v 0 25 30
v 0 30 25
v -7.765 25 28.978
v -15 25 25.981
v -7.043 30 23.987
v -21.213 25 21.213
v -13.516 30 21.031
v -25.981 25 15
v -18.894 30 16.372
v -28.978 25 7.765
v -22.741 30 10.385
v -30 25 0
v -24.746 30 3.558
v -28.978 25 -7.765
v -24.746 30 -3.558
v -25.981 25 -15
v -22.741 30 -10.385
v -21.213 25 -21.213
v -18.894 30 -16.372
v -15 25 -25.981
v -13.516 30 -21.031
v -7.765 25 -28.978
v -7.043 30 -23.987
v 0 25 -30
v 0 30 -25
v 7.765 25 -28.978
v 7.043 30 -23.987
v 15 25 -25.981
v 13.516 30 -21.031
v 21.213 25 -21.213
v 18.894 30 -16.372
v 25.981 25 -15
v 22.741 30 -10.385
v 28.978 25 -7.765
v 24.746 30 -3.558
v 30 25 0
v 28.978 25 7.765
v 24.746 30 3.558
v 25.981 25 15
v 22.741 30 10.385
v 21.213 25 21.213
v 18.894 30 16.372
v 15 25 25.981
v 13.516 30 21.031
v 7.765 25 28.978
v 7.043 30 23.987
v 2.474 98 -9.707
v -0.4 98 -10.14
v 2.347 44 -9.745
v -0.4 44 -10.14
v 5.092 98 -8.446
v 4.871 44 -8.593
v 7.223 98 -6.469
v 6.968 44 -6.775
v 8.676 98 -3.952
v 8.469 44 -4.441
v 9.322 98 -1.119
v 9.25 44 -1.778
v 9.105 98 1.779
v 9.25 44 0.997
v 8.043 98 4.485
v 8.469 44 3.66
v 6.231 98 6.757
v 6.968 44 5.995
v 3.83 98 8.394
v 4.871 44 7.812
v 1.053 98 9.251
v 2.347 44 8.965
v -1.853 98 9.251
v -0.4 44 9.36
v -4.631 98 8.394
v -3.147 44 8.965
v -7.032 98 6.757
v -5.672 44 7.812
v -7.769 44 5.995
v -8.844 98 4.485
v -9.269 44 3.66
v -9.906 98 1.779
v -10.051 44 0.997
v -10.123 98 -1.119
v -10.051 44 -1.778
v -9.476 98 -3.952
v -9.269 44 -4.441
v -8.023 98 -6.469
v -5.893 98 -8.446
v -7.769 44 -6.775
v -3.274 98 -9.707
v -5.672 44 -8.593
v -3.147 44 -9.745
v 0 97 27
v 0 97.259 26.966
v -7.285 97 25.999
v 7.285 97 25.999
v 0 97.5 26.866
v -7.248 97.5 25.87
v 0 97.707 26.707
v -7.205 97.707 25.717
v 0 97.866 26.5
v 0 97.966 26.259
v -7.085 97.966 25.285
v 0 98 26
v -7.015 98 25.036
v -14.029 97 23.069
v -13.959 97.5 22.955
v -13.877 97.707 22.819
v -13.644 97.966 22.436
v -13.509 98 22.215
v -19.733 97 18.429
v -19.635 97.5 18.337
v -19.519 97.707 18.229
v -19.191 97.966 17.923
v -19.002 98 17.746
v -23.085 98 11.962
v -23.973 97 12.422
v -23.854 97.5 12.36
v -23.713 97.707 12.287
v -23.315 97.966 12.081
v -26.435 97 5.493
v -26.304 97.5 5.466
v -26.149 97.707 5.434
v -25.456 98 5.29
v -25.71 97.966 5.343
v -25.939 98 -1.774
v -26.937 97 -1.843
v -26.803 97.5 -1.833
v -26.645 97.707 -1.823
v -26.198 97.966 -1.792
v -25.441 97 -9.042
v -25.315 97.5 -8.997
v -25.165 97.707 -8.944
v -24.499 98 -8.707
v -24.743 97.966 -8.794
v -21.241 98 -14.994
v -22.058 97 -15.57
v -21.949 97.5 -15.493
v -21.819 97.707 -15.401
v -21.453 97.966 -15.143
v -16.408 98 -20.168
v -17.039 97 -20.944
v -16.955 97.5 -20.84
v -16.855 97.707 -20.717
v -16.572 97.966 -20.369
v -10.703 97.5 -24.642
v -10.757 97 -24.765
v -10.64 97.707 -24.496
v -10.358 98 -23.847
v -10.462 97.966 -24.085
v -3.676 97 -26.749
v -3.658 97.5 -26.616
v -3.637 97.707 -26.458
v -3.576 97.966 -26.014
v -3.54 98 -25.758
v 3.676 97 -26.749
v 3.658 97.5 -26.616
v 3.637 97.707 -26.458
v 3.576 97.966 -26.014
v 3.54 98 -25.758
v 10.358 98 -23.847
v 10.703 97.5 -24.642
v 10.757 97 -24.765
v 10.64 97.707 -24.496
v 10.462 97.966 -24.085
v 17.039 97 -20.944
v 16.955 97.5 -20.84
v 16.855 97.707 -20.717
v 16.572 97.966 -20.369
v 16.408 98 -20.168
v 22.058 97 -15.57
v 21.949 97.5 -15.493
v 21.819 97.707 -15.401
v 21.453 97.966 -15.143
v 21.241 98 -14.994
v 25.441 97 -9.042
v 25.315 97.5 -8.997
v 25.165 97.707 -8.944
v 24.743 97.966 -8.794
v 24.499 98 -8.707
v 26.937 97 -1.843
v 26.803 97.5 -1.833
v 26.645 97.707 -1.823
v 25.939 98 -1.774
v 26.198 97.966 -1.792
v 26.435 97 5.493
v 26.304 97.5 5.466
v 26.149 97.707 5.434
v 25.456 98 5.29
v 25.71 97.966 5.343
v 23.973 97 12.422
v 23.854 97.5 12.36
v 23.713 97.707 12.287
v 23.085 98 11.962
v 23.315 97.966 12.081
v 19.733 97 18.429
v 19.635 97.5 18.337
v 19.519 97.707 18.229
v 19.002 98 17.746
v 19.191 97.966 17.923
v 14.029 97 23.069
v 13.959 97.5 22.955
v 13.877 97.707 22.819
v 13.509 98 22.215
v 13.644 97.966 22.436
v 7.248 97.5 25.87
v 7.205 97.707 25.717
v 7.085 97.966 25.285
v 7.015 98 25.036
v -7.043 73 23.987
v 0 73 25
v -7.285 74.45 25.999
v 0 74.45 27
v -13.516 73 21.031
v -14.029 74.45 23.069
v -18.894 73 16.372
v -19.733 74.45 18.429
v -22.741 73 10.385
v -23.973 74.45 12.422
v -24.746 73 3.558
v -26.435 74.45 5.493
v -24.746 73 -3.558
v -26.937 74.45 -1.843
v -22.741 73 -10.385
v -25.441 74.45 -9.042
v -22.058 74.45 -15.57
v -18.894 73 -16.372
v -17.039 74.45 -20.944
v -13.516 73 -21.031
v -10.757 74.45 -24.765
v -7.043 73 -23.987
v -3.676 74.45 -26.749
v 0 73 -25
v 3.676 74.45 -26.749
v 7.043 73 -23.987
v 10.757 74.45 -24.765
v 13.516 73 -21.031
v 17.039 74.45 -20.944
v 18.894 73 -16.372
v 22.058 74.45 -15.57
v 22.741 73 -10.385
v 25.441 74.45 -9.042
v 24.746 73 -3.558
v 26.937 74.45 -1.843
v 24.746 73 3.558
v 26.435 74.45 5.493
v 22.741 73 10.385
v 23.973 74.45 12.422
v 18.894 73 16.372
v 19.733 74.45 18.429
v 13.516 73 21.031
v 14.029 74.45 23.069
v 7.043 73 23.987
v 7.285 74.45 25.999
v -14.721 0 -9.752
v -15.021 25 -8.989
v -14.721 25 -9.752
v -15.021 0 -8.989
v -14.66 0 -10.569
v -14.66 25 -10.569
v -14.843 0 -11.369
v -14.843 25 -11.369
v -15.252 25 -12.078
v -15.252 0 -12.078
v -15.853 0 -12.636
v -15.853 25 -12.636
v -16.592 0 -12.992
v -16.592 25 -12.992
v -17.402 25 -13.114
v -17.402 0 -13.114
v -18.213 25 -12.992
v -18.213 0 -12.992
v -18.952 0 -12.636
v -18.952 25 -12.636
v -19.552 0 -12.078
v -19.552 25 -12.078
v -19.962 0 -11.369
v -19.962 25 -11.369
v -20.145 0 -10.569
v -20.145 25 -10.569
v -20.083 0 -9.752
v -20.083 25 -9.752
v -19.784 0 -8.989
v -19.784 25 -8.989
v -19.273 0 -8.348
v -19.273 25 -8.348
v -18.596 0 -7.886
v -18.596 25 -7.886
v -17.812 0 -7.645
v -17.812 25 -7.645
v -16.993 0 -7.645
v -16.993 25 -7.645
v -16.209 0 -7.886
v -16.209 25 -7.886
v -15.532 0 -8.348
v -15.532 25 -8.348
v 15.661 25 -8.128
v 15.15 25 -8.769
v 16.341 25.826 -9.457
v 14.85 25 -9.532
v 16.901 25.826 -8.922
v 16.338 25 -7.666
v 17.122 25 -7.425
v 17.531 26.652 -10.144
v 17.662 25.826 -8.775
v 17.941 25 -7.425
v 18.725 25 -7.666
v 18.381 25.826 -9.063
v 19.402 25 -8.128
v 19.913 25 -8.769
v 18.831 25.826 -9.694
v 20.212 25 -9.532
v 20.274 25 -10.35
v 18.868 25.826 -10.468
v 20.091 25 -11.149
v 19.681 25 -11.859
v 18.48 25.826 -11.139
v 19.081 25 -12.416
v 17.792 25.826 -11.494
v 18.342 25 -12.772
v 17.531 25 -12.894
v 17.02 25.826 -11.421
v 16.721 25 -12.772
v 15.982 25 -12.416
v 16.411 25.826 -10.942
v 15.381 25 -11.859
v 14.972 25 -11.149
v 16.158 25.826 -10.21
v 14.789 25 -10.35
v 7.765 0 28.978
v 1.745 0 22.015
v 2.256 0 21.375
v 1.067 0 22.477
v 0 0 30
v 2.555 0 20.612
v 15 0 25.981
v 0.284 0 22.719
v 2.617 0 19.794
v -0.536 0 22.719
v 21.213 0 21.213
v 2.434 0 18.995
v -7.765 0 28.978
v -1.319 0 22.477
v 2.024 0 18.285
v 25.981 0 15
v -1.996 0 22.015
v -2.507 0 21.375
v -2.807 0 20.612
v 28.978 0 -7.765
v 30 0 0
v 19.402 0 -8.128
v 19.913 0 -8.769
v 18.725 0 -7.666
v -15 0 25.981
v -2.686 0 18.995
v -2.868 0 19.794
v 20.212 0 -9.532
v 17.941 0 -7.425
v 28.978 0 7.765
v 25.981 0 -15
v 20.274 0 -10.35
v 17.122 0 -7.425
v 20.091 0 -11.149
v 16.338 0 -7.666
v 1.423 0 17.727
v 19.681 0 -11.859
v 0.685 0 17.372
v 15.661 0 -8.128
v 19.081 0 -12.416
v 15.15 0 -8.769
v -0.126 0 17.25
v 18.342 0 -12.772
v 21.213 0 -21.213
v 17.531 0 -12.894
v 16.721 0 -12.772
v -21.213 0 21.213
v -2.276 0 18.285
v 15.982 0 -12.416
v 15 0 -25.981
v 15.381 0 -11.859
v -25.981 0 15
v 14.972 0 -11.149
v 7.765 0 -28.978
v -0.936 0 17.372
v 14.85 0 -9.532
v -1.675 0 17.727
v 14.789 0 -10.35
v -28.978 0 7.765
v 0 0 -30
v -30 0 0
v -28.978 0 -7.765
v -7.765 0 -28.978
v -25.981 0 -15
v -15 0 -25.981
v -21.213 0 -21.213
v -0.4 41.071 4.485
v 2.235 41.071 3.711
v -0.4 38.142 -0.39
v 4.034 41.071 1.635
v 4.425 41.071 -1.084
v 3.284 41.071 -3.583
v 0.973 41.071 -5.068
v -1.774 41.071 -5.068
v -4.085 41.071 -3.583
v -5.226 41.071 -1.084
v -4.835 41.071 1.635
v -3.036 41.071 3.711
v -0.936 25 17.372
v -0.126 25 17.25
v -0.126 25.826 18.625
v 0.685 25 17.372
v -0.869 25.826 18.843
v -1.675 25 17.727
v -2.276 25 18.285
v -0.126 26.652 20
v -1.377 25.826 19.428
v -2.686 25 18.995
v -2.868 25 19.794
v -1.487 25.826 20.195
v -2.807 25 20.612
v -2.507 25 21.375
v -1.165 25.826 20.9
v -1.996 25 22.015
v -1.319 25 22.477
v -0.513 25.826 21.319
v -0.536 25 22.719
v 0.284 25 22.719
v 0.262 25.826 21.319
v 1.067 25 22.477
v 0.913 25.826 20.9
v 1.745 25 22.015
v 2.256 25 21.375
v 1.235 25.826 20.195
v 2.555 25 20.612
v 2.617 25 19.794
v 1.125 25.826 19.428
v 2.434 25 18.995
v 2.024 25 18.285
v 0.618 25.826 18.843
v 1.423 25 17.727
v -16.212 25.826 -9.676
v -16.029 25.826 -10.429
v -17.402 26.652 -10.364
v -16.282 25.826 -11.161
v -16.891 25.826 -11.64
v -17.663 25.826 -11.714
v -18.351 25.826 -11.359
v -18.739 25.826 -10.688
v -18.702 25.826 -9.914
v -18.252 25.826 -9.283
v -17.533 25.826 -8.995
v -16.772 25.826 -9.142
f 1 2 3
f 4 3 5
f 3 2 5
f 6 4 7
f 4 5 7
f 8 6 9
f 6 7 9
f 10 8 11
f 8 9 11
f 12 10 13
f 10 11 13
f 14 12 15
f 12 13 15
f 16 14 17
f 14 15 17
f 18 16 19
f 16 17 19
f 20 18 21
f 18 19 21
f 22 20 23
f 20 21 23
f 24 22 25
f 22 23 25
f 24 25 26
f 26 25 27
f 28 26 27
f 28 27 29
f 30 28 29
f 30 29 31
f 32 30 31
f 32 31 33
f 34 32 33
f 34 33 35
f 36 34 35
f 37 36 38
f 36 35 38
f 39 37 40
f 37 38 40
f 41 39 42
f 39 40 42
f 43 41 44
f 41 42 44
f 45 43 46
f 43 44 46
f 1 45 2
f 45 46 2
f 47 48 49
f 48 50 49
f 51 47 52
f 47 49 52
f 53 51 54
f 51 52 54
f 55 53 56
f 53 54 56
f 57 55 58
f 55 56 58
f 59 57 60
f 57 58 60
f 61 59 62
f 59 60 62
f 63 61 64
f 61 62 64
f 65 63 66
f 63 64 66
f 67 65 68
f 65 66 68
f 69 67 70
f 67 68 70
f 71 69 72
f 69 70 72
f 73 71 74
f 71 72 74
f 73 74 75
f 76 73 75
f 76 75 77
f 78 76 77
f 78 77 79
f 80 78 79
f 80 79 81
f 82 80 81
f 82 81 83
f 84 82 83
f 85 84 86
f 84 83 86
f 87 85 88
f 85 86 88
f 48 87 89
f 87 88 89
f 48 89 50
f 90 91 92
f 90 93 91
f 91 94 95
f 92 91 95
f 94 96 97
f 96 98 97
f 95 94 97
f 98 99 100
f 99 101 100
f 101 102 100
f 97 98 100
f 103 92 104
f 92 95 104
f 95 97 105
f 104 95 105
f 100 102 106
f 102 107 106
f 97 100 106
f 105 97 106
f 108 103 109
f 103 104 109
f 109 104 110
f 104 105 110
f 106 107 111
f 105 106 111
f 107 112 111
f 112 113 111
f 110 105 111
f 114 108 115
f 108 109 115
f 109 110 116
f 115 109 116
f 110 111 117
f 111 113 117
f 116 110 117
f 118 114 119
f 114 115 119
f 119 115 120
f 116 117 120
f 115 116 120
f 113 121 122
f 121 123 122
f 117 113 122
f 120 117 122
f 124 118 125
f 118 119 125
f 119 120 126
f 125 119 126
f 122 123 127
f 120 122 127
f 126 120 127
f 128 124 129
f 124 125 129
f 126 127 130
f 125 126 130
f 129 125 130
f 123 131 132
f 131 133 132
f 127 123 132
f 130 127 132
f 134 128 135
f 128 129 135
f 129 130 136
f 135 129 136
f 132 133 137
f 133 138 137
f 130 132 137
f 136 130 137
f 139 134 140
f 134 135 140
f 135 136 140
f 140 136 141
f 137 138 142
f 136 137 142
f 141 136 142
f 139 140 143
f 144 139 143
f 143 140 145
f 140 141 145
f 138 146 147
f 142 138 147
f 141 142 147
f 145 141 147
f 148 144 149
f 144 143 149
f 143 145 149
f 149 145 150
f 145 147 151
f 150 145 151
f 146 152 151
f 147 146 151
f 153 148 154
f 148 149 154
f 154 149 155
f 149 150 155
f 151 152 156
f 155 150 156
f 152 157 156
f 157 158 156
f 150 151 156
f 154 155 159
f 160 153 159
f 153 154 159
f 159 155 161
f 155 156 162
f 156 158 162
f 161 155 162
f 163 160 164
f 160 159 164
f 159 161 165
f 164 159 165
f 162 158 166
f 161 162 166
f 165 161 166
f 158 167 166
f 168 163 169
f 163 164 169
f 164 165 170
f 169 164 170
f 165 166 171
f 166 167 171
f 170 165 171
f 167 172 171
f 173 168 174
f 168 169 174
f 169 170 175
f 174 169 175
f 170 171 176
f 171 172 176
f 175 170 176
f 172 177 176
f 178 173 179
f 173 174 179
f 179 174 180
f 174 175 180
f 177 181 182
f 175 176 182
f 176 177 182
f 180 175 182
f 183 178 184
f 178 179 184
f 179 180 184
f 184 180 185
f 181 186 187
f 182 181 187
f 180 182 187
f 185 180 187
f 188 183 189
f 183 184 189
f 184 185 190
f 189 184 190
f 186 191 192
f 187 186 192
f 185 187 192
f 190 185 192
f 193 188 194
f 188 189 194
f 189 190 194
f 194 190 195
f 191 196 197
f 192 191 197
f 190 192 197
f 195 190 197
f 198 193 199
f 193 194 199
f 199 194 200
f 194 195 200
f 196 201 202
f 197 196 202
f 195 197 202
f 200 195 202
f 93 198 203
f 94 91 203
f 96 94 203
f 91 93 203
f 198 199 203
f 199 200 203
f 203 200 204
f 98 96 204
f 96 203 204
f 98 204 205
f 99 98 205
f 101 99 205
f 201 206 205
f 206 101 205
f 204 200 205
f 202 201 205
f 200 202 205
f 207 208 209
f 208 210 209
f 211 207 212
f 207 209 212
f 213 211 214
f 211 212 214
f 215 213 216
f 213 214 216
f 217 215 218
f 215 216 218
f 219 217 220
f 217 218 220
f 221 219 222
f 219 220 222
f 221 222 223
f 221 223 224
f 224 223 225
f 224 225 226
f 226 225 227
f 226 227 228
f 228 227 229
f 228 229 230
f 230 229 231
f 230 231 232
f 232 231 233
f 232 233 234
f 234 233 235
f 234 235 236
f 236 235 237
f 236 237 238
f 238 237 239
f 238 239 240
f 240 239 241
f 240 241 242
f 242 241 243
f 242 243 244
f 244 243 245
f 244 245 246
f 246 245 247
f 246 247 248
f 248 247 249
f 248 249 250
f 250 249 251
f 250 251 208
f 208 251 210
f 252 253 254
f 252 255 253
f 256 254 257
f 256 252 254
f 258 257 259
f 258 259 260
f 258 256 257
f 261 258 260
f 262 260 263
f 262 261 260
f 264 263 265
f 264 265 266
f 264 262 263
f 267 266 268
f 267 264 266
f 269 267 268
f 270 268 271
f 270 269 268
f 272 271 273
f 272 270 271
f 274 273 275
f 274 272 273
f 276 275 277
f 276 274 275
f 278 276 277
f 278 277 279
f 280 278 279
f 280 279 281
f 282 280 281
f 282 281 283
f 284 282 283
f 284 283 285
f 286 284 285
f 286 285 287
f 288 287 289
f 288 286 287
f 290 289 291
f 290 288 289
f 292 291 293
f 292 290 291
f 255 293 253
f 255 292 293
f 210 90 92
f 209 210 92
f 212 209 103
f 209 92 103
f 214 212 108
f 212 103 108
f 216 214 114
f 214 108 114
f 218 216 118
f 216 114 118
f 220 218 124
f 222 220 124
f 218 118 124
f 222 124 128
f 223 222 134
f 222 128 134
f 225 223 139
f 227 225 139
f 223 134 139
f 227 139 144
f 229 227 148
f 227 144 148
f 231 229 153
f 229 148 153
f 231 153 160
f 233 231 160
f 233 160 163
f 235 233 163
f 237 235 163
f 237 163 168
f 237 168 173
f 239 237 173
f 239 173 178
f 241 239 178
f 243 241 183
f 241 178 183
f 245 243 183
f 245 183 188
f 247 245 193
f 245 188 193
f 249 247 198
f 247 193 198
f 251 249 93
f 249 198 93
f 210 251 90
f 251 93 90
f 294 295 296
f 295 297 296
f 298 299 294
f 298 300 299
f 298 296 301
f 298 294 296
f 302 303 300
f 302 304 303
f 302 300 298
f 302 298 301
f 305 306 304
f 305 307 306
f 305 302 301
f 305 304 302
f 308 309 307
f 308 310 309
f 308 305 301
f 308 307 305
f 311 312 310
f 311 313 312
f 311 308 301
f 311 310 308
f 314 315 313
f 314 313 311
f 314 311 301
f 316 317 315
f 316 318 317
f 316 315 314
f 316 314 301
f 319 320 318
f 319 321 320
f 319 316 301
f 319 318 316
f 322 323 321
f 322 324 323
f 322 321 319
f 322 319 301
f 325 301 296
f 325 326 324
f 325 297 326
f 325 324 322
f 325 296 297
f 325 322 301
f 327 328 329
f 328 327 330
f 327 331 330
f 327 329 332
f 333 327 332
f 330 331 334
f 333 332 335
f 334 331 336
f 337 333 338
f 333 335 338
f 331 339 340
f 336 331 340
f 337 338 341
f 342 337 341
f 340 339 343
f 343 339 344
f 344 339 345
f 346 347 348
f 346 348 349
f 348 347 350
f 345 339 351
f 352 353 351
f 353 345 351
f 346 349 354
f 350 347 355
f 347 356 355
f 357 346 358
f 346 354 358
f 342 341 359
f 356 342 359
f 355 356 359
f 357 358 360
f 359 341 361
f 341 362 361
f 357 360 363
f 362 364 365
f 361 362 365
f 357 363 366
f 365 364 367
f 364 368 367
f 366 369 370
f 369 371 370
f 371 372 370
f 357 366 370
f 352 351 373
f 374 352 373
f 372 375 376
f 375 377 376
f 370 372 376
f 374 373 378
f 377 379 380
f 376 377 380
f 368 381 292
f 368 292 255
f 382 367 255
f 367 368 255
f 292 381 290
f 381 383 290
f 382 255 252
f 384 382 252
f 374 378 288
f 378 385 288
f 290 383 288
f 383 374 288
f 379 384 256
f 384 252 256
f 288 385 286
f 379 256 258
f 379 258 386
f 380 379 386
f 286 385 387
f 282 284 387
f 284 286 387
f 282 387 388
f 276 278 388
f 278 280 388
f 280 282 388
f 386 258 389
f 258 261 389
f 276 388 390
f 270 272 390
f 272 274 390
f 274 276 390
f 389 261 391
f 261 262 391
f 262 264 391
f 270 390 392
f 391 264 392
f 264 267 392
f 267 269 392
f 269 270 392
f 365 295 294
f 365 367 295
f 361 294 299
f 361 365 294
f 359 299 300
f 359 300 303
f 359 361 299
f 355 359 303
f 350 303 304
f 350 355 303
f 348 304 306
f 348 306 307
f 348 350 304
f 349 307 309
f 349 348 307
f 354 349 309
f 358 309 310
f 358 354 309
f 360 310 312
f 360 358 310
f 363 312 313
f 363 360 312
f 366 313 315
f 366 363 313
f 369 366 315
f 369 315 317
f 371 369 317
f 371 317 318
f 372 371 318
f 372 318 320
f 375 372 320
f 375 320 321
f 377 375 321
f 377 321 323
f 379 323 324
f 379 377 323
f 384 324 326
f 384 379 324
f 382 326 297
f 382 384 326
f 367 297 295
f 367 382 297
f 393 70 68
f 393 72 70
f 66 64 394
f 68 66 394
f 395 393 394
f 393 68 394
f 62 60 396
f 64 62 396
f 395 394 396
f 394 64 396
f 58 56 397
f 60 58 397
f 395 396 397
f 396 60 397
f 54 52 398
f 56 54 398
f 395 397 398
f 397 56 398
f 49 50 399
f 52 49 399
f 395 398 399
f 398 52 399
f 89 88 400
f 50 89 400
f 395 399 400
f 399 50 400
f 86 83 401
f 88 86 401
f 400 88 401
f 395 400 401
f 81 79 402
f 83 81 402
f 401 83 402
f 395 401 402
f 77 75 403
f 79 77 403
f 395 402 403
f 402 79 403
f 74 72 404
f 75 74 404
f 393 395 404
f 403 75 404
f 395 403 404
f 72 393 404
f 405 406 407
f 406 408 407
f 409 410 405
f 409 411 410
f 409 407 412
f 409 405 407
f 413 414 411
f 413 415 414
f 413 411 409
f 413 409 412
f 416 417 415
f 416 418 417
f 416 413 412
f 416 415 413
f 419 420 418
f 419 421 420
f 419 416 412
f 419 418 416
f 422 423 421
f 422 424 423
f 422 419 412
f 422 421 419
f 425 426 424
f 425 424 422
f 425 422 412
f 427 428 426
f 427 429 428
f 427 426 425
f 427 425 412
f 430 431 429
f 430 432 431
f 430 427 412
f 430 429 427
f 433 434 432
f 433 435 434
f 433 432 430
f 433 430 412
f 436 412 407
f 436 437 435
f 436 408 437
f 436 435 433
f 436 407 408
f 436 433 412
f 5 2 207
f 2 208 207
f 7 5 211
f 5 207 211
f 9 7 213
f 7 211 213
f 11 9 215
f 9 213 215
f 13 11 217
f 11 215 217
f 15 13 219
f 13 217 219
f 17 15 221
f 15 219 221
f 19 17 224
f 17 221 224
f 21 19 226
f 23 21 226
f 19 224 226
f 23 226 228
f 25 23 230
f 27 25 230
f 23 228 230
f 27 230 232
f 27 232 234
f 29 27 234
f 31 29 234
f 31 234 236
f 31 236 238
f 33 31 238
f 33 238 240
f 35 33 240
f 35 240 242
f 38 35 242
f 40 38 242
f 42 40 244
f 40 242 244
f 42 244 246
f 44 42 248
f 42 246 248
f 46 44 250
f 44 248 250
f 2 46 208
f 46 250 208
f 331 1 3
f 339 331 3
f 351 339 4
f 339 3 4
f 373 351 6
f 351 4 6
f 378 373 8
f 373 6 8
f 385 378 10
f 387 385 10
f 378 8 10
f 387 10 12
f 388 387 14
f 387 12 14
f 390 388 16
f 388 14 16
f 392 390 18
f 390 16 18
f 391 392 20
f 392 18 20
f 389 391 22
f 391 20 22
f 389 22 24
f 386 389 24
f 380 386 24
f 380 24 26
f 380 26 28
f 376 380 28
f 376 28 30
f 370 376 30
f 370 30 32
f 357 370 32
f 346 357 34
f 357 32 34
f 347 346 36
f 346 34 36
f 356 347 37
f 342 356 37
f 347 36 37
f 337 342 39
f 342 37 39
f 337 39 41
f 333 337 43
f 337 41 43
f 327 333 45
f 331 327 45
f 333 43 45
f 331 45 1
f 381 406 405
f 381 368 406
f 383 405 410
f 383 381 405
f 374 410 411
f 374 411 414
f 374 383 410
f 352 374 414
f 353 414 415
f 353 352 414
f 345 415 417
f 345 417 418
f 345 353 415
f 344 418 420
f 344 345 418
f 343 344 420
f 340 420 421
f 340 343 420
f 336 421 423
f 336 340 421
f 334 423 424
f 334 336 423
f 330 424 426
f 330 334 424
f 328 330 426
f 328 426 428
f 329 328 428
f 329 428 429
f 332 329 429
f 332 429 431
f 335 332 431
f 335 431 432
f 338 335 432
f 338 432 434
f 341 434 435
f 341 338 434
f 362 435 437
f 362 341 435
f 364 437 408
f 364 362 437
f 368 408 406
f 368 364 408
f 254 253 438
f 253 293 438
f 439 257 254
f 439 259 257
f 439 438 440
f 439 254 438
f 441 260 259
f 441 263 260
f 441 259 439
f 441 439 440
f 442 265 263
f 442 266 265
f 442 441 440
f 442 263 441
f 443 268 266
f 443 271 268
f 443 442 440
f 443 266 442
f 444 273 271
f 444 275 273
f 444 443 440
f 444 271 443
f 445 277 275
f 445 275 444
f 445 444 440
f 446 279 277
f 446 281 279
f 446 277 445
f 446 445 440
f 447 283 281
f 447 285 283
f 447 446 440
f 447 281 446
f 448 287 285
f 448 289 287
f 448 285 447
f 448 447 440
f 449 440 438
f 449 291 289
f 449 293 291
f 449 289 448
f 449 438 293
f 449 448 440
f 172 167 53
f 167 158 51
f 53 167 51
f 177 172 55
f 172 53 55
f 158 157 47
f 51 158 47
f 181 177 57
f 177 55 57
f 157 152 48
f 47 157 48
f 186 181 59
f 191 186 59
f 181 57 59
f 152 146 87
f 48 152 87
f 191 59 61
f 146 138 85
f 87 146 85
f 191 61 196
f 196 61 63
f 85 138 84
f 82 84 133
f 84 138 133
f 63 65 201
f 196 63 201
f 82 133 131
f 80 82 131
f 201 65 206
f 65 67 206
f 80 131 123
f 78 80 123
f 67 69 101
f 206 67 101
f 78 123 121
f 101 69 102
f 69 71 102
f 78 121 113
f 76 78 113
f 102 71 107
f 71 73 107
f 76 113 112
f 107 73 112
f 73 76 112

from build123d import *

# Parameters (mm, degrees)
M20X0_5_TAPPED_HOLE1_D     = 19.5
M20X0_5_TAPPED_HOLE1_DEPTH = 54
M20X0_5_TAPPED_HOLE1_TIP   = 5.858391036
CHAMFER1_SIZE              = 5
FILLET3_R                  = 1
CIRPATTERN1_COUNT          = 3


with BuildPart() as part:
    # Sketch1 → Revolve1 (revolve)
    with BuildSketch(Plane(origin=(0, 0, 0), x_dir=(0, 0, -1), z_dir=(1, 0, 0))):
        Polygon((0, 0), (-30, 0), (-30, 30), (-25, 30), (-25, 73), (-27, 74.450346012), (-27, 98), (0, 98), align=None)
    revolve(axis=Axis((0, 214.375507313, 0), (0, -1, 0)))

    # M20x0.5 Tapped Hole1
    with Locations(Plane(origin=(-0.400317765, 98, -0.390314584), x_dir=(0, 0, 1), z_dir=(0, 1, 0))):
        with Locations((0, 0)):
            Hole(M20X0_5_TAPPED_HOLE1_D / 2, depth=M20X0_5_TAPPED_HOLE1_DEPTH)
            with Locations((0, 0, -(M20X0_5_TAPPED_HOLE1_DEPTH + M20X0_5_TAPPED_HOLE1_TIP / 2))):  # 118° drill point
                Cone(0, M20X0_5_TAPPED_HOLE1_D / 2, M20X0_5_TAPPED_HOLE1_TIP, mode=Mode.SUBTRACT)

    # Chamfer1
    chamfer1_edges = [part.edges().sort_by_distance(p)[0] for p in [
        (0, 30, -30),
    ]]
    chamfer(chamfer1_edges, length=CHAMFER1_SIZE - 0.0001)  # a hair under: the kernel refuses the full size

    # Fillet3
    fillet3_edges = [part.edges().sort_by_distance(p)[0] for p in [
        (0, 98, -27),
    ]]
    fillet(fillet3_edges, radius=FILLET3_R)

    # Sketch4 → M6x0.5 Tapped Hole1 (revolve, cut)
    with BuildSketch(Plane(origin=(-0.125783676, 0, 19.999604458), x_dir=(0, 0, -1), z_dir=(1, 0, 0))):
        Polygon((0, 0), (0, 26.652366702), (2.75, 25), (2.75, 0), align=None)
    m6x0_5_tapped_hole1 = revolve(axis=Axis((-0.125783676, -6.35, 19.999604458), (0, 1, 0)), mode=Mode.SUBTRACT)

    # CirPattern1: M6x0.5 Tapped Hole1 ×3 about axis
    cirpattern1_axis = Axis((0.001065889, 0, -0.169476304), (0, 1, 0))
    for i in range(1, CIRPATTERN1_COUNT):
        add(m6x0_5_tapped_hole1.rotate(cirpattern1_axis, i * 360 / CIRPATTERN1_COUNT), mode=Mode.SUBTRACT)


solid = part.part
